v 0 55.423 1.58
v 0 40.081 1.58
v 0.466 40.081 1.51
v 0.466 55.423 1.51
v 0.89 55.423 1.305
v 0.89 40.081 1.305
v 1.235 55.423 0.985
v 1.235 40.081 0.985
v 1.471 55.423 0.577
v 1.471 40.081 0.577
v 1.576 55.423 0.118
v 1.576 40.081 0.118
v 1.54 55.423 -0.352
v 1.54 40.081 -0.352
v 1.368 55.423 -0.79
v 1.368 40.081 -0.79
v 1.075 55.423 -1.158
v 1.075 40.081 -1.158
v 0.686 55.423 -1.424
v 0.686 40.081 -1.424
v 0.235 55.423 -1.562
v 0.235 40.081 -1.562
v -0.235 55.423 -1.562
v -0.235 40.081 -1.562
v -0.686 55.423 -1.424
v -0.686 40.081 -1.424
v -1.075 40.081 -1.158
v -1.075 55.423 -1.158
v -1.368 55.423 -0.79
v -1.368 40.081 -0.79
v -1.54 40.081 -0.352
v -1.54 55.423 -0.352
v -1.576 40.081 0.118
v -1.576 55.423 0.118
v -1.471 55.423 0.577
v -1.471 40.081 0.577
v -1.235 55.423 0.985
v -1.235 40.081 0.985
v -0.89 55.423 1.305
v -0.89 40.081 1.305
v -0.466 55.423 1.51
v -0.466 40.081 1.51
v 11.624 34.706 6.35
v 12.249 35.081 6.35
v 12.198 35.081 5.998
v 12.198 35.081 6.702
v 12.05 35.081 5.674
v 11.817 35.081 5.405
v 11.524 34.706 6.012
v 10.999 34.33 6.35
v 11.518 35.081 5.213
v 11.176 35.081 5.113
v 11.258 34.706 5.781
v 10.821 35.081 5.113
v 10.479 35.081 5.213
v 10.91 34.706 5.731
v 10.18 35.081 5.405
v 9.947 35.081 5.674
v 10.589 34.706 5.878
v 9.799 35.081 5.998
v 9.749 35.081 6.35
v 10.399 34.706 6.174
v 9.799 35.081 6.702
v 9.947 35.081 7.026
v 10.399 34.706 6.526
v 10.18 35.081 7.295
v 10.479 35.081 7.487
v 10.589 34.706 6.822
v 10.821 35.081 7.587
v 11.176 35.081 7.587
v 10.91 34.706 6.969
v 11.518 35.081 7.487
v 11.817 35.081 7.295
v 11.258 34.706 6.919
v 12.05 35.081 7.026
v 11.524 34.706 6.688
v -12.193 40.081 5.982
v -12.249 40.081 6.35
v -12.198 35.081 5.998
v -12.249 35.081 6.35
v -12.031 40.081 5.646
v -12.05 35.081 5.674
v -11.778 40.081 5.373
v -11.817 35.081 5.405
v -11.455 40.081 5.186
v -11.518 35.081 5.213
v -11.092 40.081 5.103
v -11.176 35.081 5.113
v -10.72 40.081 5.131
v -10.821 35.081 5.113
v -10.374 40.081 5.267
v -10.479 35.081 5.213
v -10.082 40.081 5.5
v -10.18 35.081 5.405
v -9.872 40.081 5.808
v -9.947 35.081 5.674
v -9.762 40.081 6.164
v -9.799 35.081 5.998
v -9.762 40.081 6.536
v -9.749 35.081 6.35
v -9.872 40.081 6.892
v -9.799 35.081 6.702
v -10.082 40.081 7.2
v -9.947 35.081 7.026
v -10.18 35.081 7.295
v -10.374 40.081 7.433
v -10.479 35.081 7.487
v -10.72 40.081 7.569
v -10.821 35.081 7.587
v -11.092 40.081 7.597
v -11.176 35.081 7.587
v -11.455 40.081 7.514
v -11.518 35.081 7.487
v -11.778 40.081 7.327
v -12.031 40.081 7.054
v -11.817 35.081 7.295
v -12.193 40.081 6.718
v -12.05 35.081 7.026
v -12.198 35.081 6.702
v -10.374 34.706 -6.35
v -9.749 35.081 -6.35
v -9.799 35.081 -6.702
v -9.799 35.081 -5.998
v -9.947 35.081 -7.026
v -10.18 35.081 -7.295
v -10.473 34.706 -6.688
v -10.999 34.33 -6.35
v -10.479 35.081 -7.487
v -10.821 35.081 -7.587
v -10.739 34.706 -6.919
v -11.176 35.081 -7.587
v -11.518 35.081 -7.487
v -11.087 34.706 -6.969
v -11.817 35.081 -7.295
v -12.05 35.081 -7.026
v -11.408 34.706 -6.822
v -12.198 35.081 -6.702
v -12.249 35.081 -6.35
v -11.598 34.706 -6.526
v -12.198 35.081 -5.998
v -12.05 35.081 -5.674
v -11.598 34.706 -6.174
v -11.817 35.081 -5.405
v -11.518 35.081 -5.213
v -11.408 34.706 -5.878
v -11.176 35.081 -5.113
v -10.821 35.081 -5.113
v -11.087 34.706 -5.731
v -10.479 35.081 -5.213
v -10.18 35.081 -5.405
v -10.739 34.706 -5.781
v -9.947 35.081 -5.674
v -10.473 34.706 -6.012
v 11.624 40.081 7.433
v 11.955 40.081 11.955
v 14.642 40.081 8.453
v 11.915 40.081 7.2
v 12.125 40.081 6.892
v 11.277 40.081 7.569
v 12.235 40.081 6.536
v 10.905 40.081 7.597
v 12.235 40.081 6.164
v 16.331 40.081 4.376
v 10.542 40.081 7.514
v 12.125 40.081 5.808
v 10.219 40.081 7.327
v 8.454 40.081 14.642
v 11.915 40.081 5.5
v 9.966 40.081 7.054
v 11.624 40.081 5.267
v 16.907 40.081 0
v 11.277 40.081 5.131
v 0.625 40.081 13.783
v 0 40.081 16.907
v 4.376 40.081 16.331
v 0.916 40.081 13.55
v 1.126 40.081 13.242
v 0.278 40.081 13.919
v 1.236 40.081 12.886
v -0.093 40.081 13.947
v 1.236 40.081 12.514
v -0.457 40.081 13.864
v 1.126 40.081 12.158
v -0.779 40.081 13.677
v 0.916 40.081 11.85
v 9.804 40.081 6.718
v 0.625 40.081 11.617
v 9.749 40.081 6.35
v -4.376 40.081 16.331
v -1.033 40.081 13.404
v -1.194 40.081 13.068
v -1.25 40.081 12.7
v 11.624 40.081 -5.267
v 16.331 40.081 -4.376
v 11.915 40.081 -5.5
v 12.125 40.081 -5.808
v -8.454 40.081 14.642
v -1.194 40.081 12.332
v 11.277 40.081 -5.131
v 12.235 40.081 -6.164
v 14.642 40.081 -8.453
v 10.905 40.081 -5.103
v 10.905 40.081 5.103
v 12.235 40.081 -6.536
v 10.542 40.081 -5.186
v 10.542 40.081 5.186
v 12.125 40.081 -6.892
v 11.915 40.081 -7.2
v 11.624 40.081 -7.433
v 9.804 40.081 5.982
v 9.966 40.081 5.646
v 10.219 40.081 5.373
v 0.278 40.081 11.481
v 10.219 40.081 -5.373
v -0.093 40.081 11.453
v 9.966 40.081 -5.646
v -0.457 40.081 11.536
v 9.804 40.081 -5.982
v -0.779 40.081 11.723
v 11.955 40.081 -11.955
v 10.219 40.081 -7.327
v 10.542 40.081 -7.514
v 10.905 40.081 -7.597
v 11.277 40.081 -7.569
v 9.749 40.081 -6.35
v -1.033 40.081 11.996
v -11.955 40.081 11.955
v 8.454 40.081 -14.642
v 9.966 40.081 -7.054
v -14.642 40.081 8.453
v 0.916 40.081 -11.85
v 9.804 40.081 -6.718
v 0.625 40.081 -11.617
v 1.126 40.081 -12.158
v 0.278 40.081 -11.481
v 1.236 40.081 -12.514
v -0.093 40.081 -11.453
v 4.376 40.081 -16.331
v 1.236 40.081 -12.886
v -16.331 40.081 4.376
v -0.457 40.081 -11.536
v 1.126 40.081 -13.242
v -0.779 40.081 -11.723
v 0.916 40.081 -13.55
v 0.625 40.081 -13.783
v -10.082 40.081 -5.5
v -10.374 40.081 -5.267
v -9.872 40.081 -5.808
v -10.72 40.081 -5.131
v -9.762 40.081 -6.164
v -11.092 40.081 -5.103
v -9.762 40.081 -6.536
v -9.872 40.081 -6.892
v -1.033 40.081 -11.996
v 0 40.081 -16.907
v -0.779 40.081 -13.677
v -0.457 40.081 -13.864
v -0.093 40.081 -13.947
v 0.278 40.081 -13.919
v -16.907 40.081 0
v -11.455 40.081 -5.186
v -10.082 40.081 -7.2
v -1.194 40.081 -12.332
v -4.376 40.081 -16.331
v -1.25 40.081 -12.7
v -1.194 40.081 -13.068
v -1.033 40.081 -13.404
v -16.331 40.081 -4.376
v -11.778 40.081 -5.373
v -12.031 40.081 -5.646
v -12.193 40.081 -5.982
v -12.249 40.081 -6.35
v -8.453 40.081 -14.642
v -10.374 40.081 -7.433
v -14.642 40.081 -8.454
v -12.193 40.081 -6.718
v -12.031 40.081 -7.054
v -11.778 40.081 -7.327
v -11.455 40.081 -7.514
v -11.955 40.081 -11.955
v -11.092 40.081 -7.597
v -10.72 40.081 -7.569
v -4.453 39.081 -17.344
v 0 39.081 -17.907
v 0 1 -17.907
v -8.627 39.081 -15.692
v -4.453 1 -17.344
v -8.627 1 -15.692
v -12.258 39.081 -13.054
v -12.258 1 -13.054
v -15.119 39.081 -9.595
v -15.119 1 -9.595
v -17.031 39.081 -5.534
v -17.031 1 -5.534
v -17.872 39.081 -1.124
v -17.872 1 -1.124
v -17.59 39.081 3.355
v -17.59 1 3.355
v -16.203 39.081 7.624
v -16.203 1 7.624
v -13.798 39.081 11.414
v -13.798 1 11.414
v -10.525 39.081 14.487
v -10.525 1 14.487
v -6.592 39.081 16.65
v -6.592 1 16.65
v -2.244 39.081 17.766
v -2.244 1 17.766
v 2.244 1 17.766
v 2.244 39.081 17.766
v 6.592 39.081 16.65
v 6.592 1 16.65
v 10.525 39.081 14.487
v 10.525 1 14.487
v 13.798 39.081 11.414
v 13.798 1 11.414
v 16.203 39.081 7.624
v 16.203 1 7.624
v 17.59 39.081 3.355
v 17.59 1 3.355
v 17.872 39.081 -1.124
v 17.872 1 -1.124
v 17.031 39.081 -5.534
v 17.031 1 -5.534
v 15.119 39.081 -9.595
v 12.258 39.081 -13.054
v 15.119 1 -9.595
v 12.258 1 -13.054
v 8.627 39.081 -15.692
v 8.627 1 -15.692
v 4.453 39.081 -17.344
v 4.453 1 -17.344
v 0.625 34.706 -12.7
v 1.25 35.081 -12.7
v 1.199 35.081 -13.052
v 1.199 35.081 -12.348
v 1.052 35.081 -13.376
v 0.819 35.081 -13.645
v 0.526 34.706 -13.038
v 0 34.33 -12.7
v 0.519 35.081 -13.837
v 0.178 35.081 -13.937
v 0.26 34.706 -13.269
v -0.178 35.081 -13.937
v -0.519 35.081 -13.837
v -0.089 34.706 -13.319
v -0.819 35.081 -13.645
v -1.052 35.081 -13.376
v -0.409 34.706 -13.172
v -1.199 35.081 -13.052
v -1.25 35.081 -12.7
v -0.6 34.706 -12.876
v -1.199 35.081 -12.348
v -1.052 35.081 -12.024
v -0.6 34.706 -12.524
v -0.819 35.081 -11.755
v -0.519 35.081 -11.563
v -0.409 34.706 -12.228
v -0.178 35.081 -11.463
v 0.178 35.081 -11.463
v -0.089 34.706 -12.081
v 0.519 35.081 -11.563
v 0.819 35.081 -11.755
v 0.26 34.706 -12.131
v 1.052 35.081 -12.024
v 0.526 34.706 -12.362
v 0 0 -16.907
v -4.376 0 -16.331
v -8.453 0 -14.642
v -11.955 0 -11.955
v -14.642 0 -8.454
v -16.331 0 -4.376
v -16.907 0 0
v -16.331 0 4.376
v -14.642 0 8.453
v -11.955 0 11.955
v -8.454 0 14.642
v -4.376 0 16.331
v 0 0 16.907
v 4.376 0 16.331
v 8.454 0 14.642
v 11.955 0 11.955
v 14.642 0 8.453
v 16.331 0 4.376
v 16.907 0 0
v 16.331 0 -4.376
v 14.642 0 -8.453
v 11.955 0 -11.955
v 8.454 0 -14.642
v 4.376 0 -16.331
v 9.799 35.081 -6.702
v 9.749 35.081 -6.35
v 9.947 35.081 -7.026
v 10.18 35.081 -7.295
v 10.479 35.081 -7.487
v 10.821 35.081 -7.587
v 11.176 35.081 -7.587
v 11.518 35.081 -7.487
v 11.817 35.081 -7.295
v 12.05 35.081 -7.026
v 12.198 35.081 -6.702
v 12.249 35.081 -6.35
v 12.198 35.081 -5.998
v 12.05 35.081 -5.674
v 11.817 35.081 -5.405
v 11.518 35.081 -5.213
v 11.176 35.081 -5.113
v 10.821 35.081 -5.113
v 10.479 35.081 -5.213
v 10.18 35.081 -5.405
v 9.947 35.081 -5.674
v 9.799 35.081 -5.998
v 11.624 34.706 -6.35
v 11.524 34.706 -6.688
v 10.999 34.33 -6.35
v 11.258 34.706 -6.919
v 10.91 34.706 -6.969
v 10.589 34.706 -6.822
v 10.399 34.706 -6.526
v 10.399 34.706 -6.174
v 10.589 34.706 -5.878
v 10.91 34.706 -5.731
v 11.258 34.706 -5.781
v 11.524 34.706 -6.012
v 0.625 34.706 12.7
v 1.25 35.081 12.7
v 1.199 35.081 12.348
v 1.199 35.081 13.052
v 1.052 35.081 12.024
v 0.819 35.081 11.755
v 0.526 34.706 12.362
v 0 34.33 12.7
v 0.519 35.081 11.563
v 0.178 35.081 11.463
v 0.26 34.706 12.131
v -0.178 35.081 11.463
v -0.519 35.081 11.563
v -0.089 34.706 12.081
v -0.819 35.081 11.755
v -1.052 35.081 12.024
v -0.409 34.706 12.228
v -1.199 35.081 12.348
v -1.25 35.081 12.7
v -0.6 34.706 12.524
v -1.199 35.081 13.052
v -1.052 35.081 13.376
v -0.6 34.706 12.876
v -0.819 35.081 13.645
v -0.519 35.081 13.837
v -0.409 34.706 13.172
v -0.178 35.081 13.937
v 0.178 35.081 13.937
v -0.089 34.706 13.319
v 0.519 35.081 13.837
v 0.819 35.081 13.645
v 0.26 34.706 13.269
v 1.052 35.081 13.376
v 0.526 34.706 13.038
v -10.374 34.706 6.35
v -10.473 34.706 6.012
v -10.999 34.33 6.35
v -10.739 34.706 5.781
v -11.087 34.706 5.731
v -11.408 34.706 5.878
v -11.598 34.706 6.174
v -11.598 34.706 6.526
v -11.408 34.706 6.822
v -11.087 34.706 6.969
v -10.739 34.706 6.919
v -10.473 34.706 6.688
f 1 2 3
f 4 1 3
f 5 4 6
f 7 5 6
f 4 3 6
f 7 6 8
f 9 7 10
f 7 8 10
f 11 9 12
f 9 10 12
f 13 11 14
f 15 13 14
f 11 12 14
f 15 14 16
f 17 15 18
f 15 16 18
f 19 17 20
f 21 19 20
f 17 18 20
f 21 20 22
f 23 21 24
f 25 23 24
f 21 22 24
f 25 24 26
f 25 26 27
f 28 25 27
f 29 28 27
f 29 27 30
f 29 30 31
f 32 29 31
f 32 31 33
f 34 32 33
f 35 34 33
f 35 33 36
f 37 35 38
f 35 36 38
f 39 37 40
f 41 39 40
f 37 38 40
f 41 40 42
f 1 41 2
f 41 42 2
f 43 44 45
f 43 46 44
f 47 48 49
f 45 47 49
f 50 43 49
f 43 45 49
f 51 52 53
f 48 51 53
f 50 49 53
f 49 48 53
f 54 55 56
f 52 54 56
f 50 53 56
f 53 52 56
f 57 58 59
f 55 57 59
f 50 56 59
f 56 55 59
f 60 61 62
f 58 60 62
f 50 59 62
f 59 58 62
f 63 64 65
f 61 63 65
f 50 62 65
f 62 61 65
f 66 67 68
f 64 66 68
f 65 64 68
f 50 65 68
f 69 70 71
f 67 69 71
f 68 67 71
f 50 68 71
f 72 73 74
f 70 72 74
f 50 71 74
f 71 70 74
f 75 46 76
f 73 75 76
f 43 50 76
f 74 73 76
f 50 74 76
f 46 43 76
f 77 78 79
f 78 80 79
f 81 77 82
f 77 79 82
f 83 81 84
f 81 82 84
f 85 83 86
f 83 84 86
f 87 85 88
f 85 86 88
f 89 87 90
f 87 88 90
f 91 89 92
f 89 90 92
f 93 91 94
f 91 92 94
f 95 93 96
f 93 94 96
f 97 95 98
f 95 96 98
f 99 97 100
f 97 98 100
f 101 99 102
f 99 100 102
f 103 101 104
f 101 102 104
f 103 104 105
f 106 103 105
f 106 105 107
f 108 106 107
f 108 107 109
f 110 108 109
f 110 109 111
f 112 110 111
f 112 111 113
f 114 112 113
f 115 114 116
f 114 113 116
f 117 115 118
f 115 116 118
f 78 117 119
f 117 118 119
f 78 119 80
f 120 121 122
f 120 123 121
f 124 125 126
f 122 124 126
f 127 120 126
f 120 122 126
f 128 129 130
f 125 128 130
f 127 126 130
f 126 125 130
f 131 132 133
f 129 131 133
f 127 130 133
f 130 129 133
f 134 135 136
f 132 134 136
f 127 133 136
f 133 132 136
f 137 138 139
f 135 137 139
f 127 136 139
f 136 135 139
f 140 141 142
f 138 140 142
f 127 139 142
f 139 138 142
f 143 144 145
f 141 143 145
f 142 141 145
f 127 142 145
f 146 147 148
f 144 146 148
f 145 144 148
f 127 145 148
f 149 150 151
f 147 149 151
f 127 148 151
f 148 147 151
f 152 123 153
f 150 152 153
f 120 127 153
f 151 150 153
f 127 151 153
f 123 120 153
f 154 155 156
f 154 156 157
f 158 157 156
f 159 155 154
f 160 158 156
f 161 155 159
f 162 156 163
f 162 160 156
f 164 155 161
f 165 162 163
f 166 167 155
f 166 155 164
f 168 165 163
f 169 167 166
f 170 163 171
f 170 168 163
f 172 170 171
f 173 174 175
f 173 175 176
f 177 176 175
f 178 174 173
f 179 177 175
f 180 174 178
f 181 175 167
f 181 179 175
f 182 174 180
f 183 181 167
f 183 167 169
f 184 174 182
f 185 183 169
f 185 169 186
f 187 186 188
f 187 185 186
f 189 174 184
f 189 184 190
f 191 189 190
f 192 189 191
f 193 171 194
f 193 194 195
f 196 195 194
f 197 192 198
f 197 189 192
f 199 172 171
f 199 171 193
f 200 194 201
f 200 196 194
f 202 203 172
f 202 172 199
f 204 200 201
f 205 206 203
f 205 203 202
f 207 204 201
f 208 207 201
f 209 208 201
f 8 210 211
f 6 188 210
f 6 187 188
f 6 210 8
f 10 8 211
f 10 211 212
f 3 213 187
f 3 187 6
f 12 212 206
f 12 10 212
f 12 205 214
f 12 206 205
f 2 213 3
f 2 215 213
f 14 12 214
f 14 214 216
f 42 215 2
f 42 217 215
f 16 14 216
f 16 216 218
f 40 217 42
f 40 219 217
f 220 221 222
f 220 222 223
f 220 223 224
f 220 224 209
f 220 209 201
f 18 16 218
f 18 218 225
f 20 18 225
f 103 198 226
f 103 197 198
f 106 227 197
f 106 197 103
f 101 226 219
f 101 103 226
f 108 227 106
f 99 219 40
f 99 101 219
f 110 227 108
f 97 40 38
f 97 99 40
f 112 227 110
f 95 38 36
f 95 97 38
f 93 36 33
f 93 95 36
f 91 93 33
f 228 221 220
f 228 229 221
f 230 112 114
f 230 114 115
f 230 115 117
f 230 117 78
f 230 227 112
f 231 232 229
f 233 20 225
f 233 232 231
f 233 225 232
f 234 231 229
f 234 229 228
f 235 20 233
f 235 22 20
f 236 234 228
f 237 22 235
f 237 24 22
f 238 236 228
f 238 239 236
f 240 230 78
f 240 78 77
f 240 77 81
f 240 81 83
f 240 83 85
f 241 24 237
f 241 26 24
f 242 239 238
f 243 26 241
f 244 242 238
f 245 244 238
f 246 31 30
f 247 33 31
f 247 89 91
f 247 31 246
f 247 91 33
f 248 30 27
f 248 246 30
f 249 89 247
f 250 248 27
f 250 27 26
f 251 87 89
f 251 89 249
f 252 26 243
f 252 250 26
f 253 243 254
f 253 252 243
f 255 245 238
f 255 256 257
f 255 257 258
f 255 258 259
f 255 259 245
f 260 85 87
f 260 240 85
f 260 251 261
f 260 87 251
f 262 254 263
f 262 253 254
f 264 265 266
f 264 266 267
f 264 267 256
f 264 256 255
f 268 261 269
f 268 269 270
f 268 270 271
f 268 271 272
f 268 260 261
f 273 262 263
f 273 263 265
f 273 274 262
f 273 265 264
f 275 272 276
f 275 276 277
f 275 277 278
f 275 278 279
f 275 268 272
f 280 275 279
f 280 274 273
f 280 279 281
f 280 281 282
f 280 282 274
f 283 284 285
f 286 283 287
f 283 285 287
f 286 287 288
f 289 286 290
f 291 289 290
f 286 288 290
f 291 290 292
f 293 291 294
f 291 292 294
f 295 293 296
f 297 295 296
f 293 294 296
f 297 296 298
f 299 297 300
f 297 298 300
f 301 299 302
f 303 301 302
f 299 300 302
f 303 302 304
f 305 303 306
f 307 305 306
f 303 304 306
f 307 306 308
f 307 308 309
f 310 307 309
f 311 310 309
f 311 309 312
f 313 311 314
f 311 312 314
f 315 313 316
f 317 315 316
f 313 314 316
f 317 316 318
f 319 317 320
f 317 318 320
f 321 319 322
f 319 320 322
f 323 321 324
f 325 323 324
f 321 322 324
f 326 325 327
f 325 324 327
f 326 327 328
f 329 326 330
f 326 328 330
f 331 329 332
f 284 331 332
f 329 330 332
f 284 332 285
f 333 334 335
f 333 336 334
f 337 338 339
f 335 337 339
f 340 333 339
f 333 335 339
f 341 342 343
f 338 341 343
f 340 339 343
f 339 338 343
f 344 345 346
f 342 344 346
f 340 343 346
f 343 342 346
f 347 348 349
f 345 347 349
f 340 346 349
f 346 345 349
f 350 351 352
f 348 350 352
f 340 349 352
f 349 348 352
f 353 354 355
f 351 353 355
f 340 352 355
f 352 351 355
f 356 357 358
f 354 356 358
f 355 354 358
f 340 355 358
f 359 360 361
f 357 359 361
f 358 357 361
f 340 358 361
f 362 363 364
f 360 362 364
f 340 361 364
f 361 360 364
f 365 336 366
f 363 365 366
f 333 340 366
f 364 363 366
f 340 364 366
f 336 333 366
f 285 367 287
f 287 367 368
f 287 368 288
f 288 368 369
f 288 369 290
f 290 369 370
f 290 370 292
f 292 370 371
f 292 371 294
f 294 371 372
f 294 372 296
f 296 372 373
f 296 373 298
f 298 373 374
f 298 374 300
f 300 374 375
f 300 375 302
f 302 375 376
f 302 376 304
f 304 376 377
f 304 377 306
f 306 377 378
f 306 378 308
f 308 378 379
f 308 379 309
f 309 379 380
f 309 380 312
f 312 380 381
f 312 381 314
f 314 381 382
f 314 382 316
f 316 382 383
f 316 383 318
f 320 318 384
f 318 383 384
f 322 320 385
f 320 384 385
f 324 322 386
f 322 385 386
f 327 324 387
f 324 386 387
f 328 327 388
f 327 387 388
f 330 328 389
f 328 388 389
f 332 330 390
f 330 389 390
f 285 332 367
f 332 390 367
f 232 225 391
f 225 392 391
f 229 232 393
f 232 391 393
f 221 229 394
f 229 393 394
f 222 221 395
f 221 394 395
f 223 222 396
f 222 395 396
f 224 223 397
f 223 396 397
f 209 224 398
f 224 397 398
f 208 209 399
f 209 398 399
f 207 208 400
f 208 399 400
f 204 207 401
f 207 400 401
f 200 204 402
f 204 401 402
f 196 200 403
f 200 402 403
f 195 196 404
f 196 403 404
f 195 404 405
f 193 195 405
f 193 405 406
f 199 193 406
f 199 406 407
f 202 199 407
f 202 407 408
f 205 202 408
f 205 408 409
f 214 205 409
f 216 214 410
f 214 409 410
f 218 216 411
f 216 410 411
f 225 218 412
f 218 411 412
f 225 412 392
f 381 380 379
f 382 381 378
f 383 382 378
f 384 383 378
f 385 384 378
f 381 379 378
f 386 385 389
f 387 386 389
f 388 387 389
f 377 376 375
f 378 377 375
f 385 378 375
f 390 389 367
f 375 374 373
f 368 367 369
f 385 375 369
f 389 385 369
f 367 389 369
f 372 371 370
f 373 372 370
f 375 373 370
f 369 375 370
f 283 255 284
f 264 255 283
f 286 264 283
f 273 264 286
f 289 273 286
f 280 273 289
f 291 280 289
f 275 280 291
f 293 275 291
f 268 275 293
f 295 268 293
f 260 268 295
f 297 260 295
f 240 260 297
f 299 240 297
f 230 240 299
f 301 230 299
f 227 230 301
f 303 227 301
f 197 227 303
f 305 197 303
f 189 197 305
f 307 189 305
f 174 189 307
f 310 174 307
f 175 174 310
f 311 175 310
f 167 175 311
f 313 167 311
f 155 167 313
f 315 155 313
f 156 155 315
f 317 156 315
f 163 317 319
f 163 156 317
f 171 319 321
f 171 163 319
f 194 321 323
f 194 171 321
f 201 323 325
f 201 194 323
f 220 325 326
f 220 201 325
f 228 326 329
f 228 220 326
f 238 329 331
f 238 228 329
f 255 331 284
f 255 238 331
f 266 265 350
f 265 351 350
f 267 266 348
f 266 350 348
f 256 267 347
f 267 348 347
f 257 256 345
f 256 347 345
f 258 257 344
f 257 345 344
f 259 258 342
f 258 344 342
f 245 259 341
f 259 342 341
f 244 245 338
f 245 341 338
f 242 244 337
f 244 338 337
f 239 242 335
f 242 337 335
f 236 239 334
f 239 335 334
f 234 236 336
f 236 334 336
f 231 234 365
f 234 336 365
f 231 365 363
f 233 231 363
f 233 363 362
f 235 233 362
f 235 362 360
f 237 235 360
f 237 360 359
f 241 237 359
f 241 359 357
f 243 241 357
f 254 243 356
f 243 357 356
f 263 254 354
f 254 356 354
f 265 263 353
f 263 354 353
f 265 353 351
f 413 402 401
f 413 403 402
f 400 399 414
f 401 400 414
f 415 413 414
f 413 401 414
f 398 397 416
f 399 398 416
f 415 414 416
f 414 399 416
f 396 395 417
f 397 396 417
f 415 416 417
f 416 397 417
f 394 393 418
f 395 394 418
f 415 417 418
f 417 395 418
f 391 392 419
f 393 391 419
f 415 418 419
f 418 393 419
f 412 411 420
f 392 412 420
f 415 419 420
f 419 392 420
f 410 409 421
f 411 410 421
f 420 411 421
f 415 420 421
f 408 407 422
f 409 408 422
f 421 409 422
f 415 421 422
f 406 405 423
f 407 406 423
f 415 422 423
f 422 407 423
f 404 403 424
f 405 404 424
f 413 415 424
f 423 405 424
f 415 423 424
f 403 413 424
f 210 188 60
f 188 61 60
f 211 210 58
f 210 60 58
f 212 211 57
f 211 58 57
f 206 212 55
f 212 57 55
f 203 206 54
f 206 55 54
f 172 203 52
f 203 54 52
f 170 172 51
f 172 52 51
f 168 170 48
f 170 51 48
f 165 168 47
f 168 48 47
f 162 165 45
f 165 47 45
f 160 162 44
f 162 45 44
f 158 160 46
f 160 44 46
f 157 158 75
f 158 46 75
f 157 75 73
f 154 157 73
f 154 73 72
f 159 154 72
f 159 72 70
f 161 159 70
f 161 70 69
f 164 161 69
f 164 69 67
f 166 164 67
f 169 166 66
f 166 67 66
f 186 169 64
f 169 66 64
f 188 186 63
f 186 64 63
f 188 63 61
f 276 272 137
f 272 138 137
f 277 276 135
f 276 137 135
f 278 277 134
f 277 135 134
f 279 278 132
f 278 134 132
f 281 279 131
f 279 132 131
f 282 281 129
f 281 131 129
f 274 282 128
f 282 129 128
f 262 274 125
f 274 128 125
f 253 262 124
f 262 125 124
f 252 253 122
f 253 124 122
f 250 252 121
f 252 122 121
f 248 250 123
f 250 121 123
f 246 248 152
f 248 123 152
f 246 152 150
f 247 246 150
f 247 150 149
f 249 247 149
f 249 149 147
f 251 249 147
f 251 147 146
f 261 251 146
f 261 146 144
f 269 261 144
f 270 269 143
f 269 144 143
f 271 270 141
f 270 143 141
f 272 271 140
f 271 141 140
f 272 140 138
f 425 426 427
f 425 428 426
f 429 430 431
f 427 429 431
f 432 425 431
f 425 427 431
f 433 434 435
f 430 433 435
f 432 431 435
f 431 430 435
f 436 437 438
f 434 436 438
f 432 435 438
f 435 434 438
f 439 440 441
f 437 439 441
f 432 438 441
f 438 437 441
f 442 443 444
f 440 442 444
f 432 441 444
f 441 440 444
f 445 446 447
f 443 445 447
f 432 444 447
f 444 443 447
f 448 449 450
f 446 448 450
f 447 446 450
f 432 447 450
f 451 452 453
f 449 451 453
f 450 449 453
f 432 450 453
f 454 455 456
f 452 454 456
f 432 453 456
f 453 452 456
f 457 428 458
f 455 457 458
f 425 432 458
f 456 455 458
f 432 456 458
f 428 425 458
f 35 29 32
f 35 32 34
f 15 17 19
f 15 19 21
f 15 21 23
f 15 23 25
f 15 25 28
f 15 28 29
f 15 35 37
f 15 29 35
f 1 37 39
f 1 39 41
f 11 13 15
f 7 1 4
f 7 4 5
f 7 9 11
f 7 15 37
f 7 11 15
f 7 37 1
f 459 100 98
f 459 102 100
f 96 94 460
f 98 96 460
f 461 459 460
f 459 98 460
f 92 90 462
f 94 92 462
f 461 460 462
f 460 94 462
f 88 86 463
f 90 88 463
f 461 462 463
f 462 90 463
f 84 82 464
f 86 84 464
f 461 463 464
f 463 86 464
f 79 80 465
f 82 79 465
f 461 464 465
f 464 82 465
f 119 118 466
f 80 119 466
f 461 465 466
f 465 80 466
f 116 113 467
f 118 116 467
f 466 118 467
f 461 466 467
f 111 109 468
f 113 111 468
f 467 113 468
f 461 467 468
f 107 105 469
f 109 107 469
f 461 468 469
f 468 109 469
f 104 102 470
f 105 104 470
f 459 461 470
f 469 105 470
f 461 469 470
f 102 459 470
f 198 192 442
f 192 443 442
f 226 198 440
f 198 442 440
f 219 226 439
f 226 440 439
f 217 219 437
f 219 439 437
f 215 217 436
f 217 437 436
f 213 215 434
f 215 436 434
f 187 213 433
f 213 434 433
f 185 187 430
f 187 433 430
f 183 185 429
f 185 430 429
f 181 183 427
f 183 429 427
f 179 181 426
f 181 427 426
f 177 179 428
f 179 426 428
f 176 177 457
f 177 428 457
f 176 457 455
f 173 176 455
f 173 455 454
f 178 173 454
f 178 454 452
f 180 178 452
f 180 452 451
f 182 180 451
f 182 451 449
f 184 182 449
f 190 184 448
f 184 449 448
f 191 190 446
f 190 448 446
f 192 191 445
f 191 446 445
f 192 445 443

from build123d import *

# Parameters (mm, degrees)
SKETCH1_R                           = 17.907
BOSS_EXTRUDE1_DEPTH                 = 40.0812
M3X0_5_BOTTOMING_TAPPED_HOLE1_D     = 2.5
M3X0_5_BOTTOMING_TAPPED_HOLE1_DEPTH = 5
M3X0_5_BOTTOMING_TAPPED_HOLE1_TIP   = 0.751075774
SKETCH4_R                           = 1.58
BOSS_EXTRUDE2_DEPTH                 = 15.3416
CHAMFER1_SIZE                       = 1


with BuildPart() as part:
    # Sketch1 → Boss-Extrude1 (new body)
    with BuildSketch(Plane(origin=(0, 0, 0), x_dir=(1, 0, 0), z_dir=(0, 1, 0))):
        with Locations(Location((0, 0, 0), (0, 0, 90))):
            Circle(SKETCH1_R)
    extrude(amount=BOSS_EXTRUDE1_DEPTH)

    # M3x0.5 Bottoming Tapped Hole1
    with Locations(Plane(origin=(0, 40.0812, 0), x_dir=(1, 0, 0), z_dir=(0, 1, 0))):
        with Locations((0, 12.7), (10.998522628, 6.35), (10.998522628, -6.35), (0, -12.7), (-10.998522628, -6.35), (-10.998522628, 6.35)):
            Hole(M3X0_5_BOTTOMING_TAPPED_HOLE1_D / 2, depth=M3X0_5_BOTTOMING_TAPPED_HOLE1_DEPTH)
            with Locations((0, 0, -(M3X0_5_BOTTOMING_TAPPED_HOLE1_DEPTH + M3X0_5_BOTTOMING_TAPPED_HOLE1_TIP / 2))):  # 118° drill point
                Cone(0, M3X0_5_BOTTOMING_TAPPED_HOLE1_D / 2, M3X0_5_BOTTOMING_TAPPED_HOLE1_TIP, mode=Mode.SUBTRACT)

    # Sketch4 → Boss-Extrude2 (add)
    with BuildSketch(Plane(origin=(0, 40.0812, 0), x_dir=(1, 0, 0), z_dir=(0, 1, 0))):
        with Locations(Location((0, 0, 0), (0, 0, 270))):
            Circle(SKETCH4_R)
    extrude(amount=BOSS_EXTRUDE2_DEPTH)

    # Chamfer1
    chamfer1_edges = [part.edges().sort_by_distance(p)[0] for p in [
        (0, 0, 17.907),
        (0, 40.0812, 17.907),
    ]]
    chamfer(chamfer1_edges, length=CHAMFER1_SIZE)


solid = part.part
